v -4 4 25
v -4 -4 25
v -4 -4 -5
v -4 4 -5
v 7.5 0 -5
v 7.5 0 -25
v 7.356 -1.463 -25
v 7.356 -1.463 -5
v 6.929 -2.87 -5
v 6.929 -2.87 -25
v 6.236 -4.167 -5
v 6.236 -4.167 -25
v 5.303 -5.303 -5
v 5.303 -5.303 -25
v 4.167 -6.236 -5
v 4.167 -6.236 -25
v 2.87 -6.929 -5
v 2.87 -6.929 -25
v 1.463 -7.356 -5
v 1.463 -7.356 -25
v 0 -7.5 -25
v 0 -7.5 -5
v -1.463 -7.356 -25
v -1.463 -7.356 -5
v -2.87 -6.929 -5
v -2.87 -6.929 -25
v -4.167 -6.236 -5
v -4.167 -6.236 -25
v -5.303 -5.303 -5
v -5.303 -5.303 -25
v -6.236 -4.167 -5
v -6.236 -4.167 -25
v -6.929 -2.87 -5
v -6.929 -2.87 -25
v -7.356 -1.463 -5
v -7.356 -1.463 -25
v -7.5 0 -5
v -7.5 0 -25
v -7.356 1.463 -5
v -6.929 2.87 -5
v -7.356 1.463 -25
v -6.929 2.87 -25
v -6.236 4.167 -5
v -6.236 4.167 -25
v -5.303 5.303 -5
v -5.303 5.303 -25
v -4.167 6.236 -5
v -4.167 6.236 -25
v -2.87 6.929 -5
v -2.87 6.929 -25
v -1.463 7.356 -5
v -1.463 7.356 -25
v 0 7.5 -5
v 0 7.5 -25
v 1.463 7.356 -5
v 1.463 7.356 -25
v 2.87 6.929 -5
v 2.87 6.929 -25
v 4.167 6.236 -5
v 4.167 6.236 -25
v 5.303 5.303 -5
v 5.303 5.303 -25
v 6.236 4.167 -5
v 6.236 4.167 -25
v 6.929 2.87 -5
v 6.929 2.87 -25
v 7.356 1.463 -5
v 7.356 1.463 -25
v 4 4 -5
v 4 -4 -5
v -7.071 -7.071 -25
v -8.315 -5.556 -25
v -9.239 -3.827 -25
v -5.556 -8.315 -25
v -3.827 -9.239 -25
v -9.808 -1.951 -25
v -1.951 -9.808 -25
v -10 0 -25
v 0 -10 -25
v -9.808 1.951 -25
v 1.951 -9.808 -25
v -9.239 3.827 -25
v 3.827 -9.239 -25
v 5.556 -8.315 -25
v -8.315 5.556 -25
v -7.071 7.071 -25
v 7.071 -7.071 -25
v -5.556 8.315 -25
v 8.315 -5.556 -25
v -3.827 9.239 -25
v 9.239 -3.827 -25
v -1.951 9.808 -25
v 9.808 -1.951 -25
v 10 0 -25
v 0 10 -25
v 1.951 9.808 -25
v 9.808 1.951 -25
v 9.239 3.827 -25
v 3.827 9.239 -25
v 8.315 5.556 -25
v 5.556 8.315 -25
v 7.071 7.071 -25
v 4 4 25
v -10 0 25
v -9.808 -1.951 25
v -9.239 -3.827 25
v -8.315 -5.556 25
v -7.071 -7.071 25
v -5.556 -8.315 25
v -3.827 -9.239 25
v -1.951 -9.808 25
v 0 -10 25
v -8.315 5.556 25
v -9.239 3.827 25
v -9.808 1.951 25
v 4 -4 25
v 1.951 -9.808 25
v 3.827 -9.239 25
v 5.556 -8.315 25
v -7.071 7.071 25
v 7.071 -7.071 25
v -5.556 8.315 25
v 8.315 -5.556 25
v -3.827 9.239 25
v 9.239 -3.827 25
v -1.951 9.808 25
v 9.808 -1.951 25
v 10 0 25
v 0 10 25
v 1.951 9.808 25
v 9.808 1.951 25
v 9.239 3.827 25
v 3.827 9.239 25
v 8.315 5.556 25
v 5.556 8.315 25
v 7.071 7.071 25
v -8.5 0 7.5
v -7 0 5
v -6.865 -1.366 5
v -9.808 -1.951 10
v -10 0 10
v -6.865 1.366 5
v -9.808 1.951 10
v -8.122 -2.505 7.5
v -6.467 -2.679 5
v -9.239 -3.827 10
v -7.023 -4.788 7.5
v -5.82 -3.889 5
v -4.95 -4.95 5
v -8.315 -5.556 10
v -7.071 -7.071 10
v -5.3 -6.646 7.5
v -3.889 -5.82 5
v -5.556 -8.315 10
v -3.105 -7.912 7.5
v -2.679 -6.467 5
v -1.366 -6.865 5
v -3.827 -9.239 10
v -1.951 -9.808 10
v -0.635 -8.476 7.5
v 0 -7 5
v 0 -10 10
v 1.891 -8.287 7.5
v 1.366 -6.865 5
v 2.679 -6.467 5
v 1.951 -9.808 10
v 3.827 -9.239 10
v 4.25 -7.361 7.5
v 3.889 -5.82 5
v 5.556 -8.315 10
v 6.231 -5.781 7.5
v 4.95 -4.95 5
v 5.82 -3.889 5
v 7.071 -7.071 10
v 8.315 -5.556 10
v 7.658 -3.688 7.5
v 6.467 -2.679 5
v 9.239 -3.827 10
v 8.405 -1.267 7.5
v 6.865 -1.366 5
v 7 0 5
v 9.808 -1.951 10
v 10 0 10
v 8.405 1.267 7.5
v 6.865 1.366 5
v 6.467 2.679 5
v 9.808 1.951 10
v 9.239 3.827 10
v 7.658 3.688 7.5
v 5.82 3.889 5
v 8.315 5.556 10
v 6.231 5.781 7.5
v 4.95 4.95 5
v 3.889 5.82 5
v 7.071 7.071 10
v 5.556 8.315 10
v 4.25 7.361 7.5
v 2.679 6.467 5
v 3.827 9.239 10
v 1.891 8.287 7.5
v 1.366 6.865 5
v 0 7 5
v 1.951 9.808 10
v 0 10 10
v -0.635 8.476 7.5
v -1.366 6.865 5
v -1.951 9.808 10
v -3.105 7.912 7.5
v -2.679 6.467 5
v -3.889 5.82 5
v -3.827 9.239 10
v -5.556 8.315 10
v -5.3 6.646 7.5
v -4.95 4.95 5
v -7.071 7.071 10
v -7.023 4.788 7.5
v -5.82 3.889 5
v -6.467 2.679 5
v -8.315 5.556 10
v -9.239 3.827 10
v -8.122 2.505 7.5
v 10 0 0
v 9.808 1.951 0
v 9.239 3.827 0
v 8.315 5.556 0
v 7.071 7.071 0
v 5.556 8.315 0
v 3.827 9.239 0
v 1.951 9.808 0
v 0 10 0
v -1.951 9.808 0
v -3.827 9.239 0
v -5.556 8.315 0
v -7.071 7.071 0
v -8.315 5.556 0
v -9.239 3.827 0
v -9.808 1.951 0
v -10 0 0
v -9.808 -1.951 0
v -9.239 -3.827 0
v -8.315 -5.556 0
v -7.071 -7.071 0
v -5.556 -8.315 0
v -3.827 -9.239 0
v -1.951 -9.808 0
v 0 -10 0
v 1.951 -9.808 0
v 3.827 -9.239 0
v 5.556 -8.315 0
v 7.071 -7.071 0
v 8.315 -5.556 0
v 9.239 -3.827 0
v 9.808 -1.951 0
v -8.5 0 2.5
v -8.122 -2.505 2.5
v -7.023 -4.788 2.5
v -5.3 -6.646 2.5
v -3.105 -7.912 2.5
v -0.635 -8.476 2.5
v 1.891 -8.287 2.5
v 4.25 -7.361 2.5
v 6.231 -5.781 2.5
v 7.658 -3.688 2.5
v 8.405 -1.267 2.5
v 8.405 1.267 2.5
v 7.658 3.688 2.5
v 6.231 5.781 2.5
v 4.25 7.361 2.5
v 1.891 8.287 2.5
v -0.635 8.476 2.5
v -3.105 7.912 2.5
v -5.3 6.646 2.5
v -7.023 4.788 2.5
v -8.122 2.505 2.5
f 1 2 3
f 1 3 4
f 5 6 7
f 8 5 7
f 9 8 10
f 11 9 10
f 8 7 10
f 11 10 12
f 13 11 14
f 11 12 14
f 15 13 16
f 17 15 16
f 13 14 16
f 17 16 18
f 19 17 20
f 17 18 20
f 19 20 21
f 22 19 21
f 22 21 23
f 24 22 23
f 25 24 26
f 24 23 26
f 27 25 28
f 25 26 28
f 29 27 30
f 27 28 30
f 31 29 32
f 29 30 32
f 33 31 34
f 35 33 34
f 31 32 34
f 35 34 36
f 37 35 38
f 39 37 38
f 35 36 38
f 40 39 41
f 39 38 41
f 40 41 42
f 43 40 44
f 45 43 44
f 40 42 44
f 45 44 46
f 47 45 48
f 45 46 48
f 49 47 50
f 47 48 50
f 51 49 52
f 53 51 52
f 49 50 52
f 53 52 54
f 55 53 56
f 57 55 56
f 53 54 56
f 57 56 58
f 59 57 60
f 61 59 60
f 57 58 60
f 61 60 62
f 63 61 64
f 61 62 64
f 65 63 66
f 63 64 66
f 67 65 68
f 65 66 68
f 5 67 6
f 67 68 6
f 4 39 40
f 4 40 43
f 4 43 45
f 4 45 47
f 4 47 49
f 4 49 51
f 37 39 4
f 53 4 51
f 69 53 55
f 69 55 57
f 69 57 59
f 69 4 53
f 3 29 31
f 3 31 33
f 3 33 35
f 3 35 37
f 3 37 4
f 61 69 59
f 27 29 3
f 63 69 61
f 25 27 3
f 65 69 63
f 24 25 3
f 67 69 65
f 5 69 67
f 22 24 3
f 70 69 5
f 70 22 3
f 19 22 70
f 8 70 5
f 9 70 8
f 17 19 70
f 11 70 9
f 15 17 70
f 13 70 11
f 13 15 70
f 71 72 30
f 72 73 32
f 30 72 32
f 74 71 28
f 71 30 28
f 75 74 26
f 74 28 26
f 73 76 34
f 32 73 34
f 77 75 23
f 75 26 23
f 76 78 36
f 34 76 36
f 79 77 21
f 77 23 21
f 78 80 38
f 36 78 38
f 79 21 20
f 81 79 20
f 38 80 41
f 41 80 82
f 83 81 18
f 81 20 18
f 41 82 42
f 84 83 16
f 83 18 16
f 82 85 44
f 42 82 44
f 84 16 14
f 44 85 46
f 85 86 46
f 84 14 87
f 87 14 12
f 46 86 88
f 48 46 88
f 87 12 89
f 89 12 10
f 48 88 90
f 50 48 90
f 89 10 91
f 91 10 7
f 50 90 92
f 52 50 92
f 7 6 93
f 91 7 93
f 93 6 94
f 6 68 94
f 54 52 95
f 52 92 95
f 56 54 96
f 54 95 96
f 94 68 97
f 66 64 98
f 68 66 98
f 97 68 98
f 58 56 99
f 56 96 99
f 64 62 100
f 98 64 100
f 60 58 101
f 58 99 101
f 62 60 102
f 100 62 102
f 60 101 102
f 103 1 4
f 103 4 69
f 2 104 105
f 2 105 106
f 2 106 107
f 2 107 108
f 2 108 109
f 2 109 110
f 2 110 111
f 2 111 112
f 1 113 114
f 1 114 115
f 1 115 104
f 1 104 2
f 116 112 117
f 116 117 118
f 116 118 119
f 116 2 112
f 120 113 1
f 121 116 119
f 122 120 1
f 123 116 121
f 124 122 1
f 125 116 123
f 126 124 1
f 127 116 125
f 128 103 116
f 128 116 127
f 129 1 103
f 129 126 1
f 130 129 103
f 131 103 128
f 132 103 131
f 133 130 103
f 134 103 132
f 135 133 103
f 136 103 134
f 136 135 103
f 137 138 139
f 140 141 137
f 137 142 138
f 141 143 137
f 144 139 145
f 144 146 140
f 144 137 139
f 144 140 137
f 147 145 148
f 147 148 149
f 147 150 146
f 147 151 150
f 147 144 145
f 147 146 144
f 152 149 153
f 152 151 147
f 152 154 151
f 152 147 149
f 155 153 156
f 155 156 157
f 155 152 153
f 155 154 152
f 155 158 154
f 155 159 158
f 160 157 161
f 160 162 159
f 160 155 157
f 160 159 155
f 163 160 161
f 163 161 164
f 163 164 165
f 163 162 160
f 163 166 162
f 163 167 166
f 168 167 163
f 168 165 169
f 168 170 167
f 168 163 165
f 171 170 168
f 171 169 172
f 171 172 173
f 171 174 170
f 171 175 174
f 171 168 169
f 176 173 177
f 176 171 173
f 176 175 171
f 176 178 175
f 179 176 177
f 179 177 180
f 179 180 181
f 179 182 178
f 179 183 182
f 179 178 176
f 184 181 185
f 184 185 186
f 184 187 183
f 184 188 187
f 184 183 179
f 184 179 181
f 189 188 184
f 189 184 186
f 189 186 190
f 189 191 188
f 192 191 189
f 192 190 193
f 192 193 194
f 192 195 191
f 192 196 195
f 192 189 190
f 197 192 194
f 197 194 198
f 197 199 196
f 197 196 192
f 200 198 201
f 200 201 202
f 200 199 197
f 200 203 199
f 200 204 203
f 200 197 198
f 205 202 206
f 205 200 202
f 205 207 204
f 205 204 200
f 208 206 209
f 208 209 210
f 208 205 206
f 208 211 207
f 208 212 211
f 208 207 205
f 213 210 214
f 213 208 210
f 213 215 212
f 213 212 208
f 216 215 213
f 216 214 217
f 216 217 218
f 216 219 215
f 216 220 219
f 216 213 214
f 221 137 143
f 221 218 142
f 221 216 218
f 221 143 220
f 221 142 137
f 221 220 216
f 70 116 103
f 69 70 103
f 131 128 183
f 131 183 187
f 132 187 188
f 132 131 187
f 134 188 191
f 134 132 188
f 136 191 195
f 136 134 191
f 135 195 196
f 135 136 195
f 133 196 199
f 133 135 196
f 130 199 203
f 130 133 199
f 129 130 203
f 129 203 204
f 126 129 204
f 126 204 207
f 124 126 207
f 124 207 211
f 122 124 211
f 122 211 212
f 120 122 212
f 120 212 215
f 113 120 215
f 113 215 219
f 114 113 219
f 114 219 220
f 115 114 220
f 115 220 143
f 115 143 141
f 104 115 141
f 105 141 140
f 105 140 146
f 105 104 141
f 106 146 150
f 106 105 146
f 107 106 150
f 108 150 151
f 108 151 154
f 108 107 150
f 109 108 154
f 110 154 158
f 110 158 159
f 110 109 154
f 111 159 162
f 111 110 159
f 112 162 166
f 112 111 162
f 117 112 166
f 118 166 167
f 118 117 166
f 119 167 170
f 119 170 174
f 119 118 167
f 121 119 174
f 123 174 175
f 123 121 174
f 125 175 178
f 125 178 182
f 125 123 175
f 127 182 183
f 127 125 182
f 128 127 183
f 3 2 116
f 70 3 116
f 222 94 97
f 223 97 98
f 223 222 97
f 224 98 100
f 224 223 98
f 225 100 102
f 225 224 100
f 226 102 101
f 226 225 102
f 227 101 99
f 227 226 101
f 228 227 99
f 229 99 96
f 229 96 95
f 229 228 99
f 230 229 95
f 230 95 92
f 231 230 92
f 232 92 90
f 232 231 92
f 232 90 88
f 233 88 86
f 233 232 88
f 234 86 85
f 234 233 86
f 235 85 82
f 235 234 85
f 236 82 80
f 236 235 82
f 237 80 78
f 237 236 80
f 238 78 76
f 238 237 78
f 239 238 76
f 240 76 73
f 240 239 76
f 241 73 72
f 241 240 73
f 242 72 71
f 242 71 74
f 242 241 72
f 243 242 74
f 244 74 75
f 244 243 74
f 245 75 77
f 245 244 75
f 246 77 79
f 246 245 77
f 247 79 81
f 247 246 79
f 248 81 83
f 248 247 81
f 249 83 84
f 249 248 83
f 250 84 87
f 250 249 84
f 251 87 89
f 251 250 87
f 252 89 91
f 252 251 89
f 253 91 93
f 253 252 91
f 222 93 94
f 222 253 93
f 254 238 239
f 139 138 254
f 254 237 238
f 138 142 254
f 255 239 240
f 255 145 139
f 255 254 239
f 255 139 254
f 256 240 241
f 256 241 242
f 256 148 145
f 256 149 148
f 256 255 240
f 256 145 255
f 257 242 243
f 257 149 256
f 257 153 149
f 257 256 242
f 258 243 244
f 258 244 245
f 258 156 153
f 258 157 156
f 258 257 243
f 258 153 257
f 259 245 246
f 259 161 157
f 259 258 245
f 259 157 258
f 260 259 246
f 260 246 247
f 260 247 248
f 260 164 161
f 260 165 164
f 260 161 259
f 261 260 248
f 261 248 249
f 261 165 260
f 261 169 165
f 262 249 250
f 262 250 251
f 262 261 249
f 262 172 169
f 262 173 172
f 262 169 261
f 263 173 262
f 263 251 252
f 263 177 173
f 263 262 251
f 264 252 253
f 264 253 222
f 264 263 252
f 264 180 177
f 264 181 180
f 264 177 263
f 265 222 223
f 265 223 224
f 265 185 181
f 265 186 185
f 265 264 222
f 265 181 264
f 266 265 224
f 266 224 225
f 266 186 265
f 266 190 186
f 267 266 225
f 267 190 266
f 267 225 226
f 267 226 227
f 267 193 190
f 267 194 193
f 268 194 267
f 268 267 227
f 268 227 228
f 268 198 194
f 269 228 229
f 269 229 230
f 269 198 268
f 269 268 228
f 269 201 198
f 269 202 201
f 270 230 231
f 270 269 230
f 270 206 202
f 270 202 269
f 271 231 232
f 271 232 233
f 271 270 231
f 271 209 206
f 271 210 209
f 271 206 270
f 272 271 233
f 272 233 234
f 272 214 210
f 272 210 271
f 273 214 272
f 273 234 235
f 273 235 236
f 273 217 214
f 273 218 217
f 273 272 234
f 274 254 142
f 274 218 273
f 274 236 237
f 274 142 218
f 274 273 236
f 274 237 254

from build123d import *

# Parameters (mm, degrees)
F0_R     = 10
F1_DEPTH = 25
F2_W     = 8
F2_H     = 8
F3_DEPTH = 50.001
F7_R     = 7.5
F8_DEPTH = 20


with BuildPart() as f1:
    # F0 (on Top) → F1 (new body, symmetric)
    with BuildSketch(Plane.XY):
        Circle(F0_R)
    extrude(amount=F1_DEPTH, both=True)

    # F2 (on face) → F3 (cut, through all)
    with BuildSketch(Plane.XY.offset(25)):
        Rectangle(F2_W, F2_H)
    extrude(amount=-F3_DEPTH, mode=Mode.SUBTRACT)

    # F4 (on Front) → F6 (revolve, cut)
    with BuildSketch(Plane.XZ):
        Polygon((-10, 10), (-10, 0), (-7, 5), align=None)
    revolve(axis=Axis((0, 0, 10.121179), (0, 0, 1)), mode=Mode.SUBTRACT)

    # F7 (on face) → F8 (cut)
    with BuildSketch(Plane(origin=(0, 0, -25), x_dir=(1, 0, 0), z_dir=(0, 0, -1))):
        Circle(F7_R)
    extrude(amount=-F8_DEPTH, mode=Mode.SUBTRACT)


solid = f1.part
